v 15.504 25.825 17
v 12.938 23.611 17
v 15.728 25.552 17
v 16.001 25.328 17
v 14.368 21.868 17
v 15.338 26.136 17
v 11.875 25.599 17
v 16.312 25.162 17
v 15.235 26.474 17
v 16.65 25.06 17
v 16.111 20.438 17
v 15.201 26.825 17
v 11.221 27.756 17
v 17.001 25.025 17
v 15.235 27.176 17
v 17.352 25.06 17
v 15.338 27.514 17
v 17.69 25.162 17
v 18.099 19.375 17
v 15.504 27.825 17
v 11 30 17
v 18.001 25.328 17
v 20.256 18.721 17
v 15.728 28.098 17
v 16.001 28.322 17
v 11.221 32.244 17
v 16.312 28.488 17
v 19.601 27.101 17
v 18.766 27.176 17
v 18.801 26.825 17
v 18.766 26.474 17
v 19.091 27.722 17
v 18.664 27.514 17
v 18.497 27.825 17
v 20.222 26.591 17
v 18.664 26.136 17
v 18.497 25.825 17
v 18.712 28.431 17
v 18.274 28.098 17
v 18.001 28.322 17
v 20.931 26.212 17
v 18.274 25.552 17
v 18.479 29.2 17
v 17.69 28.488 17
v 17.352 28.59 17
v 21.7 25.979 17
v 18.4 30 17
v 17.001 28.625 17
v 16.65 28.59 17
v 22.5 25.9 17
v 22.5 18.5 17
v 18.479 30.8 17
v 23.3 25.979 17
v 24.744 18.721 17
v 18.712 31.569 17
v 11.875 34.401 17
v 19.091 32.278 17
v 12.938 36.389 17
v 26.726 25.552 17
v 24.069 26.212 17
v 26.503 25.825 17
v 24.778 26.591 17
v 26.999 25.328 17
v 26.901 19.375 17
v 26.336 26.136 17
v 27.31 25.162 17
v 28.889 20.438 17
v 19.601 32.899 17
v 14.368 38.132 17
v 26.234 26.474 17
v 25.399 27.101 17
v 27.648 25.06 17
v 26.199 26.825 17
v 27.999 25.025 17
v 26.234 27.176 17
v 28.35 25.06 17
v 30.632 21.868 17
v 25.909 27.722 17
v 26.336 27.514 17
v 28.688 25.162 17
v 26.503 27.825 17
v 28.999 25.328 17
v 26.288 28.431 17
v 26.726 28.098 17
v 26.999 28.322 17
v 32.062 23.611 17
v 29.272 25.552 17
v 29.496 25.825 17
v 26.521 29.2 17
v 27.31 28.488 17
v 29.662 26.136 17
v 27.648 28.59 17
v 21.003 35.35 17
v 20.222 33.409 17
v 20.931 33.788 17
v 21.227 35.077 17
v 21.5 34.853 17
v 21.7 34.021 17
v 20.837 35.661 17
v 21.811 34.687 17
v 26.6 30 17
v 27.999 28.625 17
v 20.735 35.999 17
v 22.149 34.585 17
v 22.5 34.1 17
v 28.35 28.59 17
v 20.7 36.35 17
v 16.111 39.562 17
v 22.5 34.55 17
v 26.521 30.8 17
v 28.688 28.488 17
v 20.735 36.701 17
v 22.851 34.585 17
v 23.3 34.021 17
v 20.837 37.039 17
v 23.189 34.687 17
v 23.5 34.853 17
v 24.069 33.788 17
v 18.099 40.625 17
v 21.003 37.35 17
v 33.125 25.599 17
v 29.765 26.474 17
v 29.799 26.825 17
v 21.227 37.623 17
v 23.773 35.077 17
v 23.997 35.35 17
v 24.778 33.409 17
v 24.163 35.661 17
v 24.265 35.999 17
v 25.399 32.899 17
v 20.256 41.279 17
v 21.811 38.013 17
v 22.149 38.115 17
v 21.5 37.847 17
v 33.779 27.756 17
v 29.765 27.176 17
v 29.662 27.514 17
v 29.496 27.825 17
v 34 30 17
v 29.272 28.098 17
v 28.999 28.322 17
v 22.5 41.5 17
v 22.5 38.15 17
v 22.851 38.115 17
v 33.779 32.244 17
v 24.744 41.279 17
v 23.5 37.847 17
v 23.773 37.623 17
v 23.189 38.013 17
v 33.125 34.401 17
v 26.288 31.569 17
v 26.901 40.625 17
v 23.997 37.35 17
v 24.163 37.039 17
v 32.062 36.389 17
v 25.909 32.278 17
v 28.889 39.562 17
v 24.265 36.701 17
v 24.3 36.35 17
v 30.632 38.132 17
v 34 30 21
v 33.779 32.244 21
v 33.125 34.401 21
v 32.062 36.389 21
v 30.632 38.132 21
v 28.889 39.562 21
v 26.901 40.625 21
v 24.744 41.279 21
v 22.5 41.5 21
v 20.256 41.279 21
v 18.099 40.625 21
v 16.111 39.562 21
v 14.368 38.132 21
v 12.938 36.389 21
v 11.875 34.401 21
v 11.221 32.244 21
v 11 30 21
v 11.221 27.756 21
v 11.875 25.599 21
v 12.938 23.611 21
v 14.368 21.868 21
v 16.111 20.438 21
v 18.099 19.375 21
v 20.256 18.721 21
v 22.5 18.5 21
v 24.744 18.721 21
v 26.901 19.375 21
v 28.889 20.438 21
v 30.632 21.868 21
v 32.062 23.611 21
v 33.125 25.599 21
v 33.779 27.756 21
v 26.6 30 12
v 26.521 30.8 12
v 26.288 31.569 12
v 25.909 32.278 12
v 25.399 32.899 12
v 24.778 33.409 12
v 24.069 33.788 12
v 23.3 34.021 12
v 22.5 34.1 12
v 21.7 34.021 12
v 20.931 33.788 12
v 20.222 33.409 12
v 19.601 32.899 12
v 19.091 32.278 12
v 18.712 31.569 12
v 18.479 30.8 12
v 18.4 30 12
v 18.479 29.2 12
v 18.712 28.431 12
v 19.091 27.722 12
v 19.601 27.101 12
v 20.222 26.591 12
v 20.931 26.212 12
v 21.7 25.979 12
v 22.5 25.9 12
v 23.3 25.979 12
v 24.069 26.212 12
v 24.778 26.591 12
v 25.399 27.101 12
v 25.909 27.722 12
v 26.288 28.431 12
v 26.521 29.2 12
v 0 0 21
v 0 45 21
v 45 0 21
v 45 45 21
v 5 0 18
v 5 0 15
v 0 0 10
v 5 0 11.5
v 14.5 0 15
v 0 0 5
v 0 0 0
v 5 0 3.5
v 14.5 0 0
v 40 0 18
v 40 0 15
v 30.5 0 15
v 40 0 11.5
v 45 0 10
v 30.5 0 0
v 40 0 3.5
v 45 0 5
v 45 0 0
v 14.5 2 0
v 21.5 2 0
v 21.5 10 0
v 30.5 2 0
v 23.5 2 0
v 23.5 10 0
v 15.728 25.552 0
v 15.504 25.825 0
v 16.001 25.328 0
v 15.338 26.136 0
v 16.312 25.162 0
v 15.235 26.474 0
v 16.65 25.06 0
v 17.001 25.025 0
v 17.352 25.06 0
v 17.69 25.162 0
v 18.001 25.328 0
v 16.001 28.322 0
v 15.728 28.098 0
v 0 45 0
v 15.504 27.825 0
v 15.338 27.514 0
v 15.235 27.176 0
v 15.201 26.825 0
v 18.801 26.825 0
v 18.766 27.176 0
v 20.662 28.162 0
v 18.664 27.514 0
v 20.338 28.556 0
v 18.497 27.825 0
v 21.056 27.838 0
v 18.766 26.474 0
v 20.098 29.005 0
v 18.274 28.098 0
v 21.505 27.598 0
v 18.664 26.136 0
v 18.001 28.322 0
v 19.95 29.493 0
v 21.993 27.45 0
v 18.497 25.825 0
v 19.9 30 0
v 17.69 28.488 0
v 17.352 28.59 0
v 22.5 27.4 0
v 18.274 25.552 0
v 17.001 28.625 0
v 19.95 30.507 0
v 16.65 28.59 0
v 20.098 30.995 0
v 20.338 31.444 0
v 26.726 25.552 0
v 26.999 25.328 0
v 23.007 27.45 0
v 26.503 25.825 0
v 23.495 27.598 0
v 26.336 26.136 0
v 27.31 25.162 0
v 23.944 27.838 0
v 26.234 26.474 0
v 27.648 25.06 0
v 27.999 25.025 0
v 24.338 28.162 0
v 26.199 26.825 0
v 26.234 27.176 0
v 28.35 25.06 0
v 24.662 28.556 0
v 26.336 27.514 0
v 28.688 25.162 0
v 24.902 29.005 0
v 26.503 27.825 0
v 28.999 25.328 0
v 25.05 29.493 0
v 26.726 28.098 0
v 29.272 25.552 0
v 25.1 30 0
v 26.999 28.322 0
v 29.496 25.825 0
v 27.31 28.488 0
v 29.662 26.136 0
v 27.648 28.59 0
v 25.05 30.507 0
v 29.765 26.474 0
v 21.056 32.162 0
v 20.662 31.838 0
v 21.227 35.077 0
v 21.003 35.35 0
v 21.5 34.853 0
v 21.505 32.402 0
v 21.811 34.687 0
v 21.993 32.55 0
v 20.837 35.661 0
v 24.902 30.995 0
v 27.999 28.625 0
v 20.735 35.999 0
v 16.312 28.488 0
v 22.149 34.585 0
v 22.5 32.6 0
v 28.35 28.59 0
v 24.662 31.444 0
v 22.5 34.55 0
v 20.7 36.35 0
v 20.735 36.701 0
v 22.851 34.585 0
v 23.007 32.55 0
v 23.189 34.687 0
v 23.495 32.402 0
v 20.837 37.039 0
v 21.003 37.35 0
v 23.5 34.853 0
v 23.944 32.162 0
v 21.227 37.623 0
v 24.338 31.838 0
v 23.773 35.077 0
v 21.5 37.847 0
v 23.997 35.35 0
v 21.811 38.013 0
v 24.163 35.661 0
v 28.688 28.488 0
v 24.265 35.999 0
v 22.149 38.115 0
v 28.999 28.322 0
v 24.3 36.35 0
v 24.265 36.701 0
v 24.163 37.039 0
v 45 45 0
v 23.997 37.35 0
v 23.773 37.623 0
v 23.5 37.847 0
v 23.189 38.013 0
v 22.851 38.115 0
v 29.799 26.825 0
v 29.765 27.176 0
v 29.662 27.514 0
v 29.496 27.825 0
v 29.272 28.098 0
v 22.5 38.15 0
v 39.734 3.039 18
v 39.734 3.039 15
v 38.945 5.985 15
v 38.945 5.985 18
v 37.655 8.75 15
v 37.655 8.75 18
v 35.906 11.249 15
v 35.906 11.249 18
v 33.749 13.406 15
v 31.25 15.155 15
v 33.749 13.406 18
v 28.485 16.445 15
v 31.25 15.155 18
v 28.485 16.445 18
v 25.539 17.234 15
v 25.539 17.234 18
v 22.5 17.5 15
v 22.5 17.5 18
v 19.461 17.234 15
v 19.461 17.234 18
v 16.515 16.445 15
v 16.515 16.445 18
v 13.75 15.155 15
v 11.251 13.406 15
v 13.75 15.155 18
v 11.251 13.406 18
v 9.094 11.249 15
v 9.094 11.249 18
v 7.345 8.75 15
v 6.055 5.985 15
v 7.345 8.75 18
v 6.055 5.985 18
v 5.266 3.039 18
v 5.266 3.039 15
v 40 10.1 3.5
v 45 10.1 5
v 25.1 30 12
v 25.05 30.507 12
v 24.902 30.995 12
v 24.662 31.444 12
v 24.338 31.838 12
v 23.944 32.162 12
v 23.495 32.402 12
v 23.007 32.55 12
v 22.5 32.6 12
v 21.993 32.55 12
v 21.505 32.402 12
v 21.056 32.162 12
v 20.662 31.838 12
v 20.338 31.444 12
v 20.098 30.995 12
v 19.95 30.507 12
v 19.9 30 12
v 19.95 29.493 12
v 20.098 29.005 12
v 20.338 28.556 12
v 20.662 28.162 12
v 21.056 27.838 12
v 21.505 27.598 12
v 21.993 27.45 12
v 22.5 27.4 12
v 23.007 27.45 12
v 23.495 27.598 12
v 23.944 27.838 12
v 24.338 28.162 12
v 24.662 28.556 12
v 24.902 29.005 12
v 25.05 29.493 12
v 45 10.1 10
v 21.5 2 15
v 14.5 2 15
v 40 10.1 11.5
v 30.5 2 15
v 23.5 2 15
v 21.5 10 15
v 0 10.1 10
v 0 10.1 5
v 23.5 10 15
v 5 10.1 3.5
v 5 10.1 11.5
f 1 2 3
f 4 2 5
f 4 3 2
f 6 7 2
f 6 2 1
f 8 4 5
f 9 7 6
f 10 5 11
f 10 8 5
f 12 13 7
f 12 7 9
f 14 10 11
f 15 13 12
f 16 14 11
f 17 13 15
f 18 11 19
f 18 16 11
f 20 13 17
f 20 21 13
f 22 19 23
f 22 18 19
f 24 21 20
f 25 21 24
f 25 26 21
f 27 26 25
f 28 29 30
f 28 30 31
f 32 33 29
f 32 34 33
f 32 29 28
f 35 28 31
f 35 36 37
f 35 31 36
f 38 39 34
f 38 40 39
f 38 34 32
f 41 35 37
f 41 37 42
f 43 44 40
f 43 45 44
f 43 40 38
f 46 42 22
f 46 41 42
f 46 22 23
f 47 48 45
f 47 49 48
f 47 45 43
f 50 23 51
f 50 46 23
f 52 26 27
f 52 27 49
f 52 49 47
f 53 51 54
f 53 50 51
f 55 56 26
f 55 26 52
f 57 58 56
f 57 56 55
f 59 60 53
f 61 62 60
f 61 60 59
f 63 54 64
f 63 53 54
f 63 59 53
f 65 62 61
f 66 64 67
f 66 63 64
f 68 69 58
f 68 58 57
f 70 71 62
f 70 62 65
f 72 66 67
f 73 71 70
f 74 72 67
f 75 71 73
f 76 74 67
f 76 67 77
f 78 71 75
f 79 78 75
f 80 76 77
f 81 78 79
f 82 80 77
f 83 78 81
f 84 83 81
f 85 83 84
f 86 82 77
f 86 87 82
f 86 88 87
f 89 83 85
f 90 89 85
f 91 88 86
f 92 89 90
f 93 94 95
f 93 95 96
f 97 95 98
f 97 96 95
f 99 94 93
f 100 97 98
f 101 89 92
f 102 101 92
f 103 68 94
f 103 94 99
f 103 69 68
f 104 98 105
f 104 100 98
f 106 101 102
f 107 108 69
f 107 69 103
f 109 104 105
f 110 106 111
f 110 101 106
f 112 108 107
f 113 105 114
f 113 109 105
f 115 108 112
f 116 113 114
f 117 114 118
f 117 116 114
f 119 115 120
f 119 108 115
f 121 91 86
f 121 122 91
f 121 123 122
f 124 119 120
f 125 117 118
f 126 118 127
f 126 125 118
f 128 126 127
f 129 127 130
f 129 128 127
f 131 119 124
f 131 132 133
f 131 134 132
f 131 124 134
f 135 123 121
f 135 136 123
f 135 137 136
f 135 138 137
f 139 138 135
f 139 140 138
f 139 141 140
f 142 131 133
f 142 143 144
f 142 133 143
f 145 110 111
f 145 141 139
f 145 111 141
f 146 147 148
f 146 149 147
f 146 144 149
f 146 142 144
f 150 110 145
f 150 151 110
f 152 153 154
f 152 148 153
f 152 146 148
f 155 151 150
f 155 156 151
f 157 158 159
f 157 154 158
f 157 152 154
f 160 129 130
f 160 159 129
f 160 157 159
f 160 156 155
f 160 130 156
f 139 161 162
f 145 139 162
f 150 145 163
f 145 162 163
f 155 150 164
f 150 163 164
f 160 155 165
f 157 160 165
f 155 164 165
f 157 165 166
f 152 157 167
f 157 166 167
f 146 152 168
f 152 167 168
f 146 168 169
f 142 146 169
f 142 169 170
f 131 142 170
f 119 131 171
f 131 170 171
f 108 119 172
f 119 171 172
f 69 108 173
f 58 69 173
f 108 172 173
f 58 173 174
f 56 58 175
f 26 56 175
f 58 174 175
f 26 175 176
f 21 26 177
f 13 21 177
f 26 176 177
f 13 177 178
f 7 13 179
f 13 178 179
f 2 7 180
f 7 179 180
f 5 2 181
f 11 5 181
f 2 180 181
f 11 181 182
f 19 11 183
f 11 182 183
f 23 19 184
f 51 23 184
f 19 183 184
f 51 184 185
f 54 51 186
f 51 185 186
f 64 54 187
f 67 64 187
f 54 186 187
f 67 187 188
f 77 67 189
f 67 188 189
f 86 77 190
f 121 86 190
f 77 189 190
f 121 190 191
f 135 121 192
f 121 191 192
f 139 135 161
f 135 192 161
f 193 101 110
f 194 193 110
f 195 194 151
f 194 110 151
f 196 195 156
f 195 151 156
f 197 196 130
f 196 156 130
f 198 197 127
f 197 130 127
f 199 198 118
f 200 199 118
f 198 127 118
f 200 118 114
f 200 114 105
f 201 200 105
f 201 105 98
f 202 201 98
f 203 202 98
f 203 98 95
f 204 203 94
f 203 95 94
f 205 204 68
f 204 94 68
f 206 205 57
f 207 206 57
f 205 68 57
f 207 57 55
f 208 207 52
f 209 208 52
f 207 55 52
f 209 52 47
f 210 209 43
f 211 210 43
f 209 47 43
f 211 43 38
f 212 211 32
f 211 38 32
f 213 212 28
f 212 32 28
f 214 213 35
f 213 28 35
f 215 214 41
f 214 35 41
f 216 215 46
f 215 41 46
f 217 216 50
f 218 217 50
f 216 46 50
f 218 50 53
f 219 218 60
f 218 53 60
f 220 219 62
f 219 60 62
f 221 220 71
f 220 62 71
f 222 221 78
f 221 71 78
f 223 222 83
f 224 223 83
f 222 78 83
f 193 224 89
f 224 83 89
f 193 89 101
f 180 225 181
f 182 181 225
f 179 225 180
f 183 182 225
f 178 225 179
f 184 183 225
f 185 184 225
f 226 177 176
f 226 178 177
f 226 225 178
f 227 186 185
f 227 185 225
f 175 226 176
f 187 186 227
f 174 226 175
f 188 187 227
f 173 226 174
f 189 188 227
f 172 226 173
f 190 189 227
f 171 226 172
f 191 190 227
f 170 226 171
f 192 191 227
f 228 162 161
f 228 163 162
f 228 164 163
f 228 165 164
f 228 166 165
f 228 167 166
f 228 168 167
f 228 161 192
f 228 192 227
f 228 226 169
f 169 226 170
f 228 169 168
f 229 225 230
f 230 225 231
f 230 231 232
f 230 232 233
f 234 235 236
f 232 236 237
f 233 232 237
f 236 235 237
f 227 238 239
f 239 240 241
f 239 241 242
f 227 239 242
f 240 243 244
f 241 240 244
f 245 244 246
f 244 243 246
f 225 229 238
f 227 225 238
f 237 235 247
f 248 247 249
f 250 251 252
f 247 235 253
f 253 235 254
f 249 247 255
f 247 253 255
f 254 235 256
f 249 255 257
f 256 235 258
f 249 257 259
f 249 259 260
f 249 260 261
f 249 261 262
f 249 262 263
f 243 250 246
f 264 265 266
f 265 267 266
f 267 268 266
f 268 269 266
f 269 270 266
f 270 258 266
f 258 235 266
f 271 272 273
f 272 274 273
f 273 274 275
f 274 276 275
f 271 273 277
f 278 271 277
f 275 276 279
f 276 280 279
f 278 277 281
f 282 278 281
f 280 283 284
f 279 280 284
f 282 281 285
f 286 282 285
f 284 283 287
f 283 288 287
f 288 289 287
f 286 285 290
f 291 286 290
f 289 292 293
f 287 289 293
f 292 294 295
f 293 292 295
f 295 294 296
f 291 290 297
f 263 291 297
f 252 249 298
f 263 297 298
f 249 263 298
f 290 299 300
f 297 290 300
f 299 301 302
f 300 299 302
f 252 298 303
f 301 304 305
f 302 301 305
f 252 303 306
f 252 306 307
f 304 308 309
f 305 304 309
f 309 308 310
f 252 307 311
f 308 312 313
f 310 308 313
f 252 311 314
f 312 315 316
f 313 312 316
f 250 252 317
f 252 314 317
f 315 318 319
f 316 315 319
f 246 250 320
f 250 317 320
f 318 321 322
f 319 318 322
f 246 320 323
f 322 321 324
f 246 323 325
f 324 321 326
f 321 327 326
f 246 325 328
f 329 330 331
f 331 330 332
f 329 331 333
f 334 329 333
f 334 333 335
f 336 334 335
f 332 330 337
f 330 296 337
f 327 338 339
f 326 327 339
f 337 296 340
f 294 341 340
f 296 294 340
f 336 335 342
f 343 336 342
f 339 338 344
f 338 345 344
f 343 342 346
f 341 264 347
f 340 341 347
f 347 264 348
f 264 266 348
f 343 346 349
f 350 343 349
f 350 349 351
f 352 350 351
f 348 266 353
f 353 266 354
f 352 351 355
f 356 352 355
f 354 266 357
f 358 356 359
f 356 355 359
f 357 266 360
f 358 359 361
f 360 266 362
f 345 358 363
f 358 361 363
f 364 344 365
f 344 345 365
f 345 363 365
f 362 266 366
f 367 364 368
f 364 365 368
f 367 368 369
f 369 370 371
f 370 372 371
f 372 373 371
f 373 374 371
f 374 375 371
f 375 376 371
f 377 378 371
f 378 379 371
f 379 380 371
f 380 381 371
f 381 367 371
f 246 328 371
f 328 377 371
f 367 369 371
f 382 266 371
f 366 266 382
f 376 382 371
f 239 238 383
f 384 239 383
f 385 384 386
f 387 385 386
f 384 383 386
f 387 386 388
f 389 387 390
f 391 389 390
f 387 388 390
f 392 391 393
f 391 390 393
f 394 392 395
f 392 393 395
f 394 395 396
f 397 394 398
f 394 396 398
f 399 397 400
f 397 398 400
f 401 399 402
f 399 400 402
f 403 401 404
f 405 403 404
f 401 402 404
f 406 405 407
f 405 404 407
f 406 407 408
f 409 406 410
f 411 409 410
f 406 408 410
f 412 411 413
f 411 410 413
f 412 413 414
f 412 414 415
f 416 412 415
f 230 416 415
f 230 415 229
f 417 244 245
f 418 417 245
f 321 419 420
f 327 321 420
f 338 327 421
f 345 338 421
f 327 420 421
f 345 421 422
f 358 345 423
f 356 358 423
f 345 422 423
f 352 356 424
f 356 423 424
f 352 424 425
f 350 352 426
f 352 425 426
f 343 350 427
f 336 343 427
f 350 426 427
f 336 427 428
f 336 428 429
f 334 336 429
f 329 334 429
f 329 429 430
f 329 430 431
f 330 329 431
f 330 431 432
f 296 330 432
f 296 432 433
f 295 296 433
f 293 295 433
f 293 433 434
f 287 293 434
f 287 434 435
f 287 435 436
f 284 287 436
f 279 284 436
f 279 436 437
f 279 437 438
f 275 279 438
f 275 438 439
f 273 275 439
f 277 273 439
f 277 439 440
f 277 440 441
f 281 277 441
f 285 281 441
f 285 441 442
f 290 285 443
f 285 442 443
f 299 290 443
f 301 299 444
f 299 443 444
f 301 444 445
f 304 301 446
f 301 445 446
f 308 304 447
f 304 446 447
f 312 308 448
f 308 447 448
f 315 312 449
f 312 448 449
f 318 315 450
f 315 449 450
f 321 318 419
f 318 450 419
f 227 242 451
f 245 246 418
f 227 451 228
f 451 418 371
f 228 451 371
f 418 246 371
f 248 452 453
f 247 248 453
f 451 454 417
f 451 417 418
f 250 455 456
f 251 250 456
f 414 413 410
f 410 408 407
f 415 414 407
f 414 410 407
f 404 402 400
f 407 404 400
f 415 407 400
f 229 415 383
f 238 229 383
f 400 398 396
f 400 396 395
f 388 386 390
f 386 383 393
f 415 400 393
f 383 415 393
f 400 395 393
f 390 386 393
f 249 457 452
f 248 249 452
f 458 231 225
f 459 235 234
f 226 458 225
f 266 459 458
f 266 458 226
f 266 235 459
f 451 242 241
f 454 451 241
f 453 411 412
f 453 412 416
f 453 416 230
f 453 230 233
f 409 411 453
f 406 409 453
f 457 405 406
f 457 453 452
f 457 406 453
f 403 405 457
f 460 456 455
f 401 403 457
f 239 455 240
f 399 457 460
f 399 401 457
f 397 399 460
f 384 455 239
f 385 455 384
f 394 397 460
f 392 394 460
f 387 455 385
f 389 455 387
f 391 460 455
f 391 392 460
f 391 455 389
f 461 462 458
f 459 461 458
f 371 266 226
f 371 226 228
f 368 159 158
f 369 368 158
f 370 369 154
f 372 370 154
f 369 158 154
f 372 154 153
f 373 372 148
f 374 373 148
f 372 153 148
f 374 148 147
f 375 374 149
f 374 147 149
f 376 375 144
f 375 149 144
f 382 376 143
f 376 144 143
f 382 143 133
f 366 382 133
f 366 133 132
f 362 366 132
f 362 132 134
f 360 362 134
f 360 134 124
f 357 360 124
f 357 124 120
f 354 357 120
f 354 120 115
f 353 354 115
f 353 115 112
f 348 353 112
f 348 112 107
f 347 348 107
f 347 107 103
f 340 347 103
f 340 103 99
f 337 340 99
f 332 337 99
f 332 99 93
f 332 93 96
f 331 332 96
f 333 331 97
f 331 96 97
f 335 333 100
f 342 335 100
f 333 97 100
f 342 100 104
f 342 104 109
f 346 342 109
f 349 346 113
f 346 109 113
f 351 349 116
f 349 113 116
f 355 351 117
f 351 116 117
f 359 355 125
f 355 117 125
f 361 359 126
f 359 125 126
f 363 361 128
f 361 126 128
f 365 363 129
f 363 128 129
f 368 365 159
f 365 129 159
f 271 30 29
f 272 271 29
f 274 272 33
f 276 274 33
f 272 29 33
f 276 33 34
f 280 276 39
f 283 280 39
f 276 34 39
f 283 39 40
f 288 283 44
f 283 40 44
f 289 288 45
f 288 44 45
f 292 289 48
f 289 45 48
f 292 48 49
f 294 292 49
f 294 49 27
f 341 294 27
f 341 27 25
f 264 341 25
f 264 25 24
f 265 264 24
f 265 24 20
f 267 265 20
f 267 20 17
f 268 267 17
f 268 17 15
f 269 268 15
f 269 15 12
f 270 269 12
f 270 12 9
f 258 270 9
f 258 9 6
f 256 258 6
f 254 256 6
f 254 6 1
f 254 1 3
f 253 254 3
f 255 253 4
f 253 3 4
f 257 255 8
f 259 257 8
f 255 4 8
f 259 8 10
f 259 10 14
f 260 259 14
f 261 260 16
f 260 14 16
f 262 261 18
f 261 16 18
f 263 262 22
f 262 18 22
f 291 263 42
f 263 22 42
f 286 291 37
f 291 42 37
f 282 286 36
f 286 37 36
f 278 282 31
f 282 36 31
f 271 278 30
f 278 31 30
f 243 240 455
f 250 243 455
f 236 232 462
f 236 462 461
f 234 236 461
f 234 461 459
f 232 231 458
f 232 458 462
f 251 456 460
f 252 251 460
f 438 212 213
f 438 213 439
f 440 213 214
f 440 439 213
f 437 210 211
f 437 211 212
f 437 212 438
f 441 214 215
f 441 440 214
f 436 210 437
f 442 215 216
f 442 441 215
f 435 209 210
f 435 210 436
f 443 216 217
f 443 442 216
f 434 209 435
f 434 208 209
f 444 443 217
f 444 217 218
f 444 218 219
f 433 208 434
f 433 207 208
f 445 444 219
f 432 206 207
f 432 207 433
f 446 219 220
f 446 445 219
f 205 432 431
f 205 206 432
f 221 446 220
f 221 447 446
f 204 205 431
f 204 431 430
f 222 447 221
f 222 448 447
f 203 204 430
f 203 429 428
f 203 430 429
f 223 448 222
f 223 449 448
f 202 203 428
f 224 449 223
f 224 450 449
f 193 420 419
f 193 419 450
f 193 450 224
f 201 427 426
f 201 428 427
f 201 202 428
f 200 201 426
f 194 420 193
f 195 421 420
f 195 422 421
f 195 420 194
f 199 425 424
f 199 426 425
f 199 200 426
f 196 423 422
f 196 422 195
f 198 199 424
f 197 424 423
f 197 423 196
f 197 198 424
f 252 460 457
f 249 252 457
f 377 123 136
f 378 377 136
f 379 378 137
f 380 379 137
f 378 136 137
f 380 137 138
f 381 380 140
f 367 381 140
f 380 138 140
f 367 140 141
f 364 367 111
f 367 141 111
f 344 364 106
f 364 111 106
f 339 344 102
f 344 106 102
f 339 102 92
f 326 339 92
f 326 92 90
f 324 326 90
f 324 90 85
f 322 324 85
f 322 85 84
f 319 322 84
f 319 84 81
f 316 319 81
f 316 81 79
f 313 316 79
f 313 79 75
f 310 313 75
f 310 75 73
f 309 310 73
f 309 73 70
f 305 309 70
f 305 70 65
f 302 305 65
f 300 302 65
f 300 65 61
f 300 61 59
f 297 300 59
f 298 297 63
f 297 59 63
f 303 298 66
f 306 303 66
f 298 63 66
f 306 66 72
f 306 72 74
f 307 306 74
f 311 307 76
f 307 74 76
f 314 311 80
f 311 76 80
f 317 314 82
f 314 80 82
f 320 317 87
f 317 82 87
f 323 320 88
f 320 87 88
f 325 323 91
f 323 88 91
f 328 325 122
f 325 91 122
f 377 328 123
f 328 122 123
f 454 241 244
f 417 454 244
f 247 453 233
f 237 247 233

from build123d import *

# Parameters (mm, degrees)
SKETCH1_W           = 45
SKETCH1_H           = 45
BOSS_EXTRUDE1_DEPTH = 15
CUT_EXTRUDE1_DEPTH  = 66.383484153
CUT_EXTRUDE2_DEPTH  = 10.1
SKETCH4_W           = 45
SKETCH4_H           = 45
BOSS_EXTRUDE2_DEPTH = 3
SKETCH5_R           = 17.5
CUT_EXTRUDE3_DEPTH  = 3
SKETCH6_W           = 45
SKETCH6_H           = 45
BOSS_EXTRUDE3_DEPTH = 3
SKETCH7_R           = 2.6
CUT_EXTRUDE4_DEPTH  = 68.014923711
SKETCH8_R           = 1.8
CUT_EXTRUDE5_DEPTH  = 68.014923711
SKETCH9_R           = 11.5
CUT_EXTRUDE6_DEPTH  = 4
SKETCH10_R          = 4.1
CUT_EXTRUDE7_DEPTH  = 5


with BuildPart() as part:
    # Sketch1 → Boss-Extrude1 (new body)
    with BuildSketch(Plane.XY):
        with Locations((22.5, 22.5)):
            Rectangle(SKETCH1_W, SKETCH1_H)
    extrude(amount=BOSS_EXTRUDE1_DEPTH)

    # Sketch2 → Cut-Extrude1 (cut, through all)
    with BuildSketch(Plane.XY.offset(15)):
        Polygon((14.5, 0), (30.5, 0), (30.5, 2), (23.5, 2), (23.5, 10), (21.5, 10), (21.5, 2), (14.5, 2), align=None)
    extrude(amount=-CUT_EXTRUDE1_DEPTH, mode=Mode.SUBTRACT)

    # Sketch3 → Cut-Extrude2 (cut)
    with BuildSketch(Plane.XZ):
        Polygon((45, 10), (40, 11.5), (40, 3.5), (45, 5), align=None)
    cut_extrude2 = extrude(amount=-CUT_EXTRUDE2_DEPTH, mode=Mode.SUBTRACT)

    # Mirror1: Cut-Extrude2 across plane
    add(cut_extrude2.mirror(Plane(origin=(22.5, 0, 0), x_dir=(0, 0, 1), z_dir=(1, 0, 0))), mode=Mode.SUBTRACT)

    # Sketch4 → Boss-Extrude2 (add)
    with BuildSketch(Plane.XY.offset(15)):
        with Locations((22.5, 22.5)):
            Rectangle(SKETCH4_W, SKETCH4_H)
    extrude(amount=BOSS_EXTRUDE2_DEPTH)

    # Sketch5 → Cut-Extrude3 (cut)
    with BuildSketch(Plane.XY.offset(18)):
        with Locations((22.5, 0)):
            Circle(SKETCH5_R)
    extrude(amount=-CUT_EXTRUDE3_DEPTH, mode=Mode.SUBTRACT)

    # Sketch6 → Boss-Extrude3 (add)
    with BuildSketch(Plane.XY.offset(18)):
        with Locations((22.5, 22.5)):
            Rectangle(SKETCH6_W, SKETCH6_H)
    extrude(amount=BOSS_EXTRUDE3_DEPTH)

    # Sketch7 → Cut-Extrude4 (cut, through all)
    with BuildSketch(Plane.XY.offset(21)):
        with Locations((22.5, 30)):
            Circle(SKETCH7_R)
    extrude(amount=-CUT_EXTRUDE4_DEPTH, mode=Mode.SUBTRACT)

    # Sketch8 → Cut-Extrude5 (cut, through all)
    with BuildSketch(Plane.XY.offset(21)):
        with Locations((22.5, 36.35)):
            Circle(SKETCH8_R)
        with Locations((27.999261314, 26.825)):
            Circle(SKETCH8_R)
        with Locations((17.000738686, 26.825)):
            Circle(SKETCH8_R)
    extrude(amount=-CUT_EXTRUDE5_DEPTH, mode=Mode.SUBTRACT)

    # Sketch9 → Cut-Extrude6 (cut)
    with BuildSketch(Plane.XY.offset(21)):
        with Locations((22.5, 30)):
            Circle(SKETCH9_R)
    extrude(amount=-CUT_EXTRUDE6_DEPTH, mode=Mode.SUBTRACT)

    # Sketch10 → Cut-Extrude7 (cut)
    with BuildSketch(Plane.XY.offset(17)):
        with Locations((22.5, 30)):
            Circle(SKETCH10_R)
    extrude(amount=-CUT_EXTRUDE7_DEPTH, mode=Mode.SUBTRACT)


solid = part.part
